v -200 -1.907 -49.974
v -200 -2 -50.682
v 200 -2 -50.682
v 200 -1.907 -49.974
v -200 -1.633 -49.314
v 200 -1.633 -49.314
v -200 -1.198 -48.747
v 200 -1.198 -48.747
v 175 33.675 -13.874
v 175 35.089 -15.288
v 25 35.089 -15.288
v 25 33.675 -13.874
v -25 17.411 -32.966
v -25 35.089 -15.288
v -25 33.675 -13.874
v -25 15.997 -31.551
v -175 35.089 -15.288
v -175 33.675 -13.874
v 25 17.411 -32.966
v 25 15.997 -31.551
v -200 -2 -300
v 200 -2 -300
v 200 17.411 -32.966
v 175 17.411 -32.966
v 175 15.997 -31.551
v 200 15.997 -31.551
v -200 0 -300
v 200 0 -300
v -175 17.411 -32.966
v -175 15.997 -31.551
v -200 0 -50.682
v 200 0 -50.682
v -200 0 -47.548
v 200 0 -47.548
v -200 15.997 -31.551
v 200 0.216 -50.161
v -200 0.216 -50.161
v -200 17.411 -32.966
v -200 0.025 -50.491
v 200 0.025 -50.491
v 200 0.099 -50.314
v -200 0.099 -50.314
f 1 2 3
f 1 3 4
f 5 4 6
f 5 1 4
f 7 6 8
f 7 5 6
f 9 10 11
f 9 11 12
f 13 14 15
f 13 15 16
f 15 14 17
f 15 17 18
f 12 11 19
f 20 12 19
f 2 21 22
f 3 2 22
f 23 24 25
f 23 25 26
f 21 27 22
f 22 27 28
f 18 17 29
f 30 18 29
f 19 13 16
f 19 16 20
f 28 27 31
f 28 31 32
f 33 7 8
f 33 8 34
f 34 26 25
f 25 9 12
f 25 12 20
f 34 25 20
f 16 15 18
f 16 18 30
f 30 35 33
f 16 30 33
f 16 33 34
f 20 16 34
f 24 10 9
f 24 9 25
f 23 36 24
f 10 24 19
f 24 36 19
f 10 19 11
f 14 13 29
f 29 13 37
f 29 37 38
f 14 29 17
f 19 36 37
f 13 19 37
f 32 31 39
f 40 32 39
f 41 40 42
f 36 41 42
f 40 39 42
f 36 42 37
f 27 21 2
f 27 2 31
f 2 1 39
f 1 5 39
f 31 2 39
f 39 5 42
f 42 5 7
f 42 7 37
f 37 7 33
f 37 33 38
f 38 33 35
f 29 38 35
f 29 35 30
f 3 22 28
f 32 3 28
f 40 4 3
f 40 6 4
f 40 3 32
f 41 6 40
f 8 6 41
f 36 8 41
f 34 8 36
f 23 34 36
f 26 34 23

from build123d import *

# Parameters (mm, degrees)
ESBO_O1_W               = 400
ESBO_O1_H               = 300
FLANGE_BASE1_DEPTH      = 2
DOBRA_START             = -200
DOBRA_ESBO_ADA1_DEPTH   = 400
DOBRA_ESBO_ADA1_2_DEPTH = 400
ESBO_O9_W               = 25
ESBO_O9_H               = 25
ESBO_O9_W_2             = 50
CORTE_EXTRUS_O1_DEPTH   = 2


# Read off the part's stored shape, not the designer's step: Dobra esboçada1
# Sheet-metal steps are written as plain solids
with BuildPart() as part:
    # Esboço1 → Flange-base1 (new body)
    with BuildSketch(Plane(origin=(0, 0, 0), x_dir=(1, 0, 0), z_dir=(0, 1, 0))):
        with Locations((0, 150)):
            Rectangle(ESBO_O1_W, ESBO_O1_H)
    extrude(amount=-FLANGE_BASE1_DEPTH)

    # Dobra esboçada1 outline → Dobra esboçada1 (cut)
    with BuildSketch(Plane.YZ.offset(DOBRA_START)):
        with BuildLine():
            Line((-1.198468417, -48.746892808), (0, -47.548424391))
            Line((0, -47.548424391), (0, 0))
            Line((0, 0), (-2, 0))
            Line((-2, 0), (-2, -50.681961225))
            ThreePointArc((-2, -50.681961225), (-1.791688729, -49.634709744), (-1.198468417, -48.746892808))
        make_face()
    extrude(amount=DOBRA_ESBO_ADA1_DEPTH, mode=Mode.SUBTRACT)

    # Dobra esbo_ada1 2 outline → Dobra esbo_ada1 2 (add)
    with BuildSketch(Plane.YZ.offset(DOBRA_START)):
        with BuildLine():
            Line((35.088864797, -15.287986718), (33.674651235, -13.873773155))
            Line((33.674651235, -13.873773155), (0, -47.548424391))
            Line((0, -47.548424391), (0, -50.681961225))
            ThreePointArc((0, -50.681961225), (0.056070336, -50.400076609), (0.215745145, -50.16110637))
            Line((0.215745145, -50.16110637), (35.088864797, -15.287986718))
        make_face()
    extrude(amount=DOBRA_ESBO_ADA1_2_DEPTH)

    # Esboço9 → Corte-extrusão1 (cut)
    with BuildSketch(Plane(origin=(0, 25.188425758, -25.188425758), x_dir=(1, 0, 0), z_dir=(0, 0.7071067811865464, -0.7071067811865488))):
        with Locations((-187.5, -1.501335164)):
            Rectangle(ESBO_O9_W, ESBO_O9_H)
        with Locations((0, -1.501335164)):
            Rectangle(ESBO_O9_W_2, ESBO_O9_H)
        with Locations((187.5, -1.501335164)):
            Rectangle(ESBO_O9_W, ESBO_O9_H)
    extrude(amount=-CORTE_EXTRUS_O1_DEPTH, mode=Mode.SUBTRACT)


solid = part.part
